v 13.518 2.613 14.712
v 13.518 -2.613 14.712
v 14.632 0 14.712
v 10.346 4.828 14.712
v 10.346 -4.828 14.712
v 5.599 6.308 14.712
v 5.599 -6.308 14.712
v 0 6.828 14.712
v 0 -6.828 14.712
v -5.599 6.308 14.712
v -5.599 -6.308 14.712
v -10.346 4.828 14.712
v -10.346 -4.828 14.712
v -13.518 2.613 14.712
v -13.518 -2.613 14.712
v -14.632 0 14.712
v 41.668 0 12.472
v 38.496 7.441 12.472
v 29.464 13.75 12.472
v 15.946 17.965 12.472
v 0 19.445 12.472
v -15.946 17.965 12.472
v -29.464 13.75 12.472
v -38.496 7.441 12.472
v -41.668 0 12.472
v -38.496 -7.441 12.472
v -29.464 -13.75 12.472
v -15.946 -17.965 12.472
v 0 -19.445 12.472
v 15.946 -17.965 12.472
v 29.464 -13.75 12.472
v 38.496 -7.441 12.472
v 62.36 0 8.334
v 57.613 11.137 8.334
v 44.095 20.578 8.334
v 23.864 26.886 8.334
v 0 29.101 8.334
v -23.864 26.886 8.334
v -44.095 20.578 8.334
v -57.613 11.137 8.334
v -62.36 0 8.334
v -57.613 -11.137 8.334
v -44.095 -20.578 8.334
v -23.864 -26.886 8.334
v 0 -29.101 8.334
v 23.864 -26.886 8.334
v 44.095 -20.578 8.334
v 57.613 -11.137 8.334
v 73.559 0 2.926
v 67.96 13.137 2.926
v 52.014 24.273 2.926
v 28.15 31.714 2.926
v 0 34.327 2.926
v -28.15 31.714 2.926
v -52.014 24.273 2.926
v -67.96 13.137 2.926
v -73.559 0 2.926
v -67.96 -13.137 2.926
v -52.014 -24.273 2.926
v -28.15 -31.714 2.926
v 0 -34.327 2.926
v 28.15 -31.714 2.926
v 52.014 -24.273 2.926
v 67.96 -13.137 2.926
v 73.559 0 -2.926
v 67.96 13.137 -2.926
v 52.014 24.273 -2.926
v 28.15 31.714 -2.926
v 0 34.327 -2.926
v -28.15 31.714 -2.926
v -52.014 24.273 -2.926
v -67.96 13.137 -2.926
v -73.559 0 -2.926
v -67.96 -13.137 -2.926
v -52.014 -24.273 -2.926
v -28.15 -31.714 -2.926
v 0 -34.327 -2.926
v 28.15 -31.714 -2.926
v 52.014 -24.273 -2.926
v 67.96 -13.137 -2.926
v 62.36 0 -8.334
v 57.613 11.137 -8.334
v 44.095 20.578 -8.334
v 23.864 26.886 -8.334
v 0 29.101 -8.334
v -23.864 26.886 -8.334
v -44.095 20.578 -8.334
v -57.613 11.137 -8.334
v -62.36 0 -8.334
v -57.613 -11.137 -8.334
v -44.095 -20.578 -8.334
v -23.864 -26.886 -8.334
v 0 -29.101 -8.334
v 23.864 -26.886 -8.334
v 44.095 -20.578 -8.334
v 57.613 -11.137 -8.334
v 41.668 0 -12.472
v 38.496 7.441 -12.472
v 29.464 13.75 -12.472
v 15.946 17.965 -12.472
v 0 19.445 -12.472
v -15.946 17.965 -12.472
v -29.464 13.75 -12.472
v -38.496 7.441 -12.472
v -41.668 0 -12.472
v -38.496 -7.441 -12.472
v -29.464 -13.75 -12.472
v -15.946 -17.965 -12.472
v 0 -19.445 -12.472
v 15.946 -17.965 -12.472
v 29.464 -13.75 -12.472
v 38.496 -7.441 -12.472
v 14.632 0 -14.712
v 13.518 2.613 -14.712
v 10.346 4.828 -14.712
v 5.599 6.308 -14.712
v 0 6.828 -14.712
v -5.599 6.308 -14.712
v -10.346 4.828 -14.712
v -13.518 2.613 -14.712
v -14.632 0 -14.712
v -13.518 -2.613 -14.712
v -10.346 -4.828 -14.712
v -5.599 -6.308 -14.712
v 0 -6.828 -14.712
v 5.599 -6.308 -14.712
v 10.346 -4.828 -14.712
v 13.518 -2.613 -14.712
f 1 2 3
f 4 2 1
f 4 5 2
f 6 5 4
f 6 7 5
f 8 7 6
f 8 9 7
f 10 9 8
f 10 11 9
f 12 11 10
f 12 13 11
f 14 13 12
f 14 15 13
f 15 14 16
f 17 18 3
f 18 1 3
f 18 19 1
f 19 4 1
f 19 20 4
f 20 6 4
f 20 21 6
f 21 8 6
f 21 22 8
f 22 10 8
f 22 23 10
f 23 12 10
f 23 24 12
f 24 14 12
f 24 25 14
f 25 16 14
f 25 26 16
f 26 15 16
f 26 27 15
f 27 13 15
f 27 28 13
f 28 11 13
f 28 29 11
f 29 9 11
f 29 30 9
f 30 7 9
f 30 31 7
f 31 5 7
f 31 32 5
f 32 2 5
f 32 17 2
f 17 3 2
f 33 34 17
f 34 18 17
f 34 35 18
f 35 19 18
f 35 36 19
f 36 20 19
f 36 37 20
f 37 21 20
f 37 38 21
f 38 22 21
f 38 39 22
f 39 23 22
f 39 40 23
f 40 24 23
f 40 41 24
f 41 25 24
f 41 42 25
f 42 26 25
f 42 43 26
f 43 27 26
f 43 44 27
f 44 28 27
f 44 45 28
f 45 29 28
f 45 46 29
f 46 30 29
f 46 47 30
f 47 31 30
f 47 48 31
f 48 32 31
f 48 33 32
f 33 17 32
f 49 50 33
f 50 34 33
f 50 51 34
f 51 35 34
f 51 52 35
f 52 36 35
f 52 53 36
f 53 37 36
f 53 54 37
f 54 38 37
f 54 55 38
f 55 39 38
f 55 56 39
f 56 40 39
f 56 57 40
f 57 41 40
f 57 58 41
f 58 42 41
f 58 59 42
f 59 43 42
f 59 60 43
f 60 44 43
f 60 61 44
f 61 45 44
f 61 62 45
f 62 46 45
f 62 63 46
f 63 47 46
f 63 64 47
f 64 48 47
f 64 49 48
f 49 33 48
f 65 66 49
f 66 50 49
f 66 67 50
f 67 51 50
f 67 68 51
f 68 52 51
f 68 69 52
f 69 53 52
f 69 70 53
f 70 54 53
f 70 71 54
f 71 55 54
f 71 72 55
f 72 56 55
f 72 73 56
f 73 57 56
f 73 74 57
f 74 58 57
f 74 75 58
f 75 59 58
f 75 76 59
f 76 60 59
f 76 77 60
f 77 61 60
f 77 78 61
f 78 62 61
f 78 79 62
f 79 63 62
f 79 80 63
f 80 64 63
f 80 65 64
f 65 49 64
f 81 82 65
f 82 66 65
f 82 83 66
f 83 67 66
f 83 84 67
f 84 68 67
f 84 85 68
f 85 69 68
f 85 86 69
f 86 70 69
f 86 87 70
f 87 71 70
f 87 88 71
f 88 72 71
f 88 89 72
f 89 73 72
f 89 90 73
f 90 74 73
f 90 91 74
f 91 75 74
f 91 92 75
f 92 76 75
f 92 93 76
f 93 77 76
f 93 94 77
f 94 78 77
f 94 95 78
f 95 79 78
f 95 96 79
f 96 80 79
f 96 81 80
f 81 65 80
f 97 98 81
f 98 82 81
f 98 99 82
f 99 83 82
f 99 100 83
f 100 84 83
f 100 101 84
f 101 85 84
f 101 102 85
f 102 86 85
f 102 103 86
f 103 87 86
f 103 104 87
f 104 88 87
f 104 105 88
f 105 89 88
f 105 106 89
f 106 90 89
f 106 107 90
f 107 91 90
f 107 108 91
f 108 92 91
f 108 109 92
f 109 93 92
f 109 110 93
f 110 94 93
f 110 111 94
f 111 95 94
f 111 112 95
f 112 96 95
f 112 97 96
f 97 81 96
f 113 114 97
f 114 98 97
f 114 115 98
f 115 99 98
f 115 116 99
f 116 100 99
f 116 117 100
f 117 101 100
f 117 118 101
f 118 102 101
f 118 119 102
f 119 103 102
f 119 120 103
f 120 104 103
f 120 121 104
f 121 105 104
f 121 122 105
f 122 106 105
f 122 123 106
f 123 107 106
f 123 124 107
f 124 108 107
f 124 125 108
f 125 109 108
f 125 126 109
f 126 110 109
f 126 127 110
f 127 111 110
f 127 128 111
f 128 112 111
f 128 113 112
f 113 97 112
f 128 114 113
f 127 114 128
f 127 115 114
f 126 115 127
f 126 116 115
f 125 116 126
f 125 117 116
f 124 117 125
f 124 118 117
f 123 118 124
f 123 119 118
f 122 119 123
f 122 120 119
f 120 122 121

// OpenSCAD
// Generated by SolidPython 1.0.1 on 2020-07-29 00:46:51


scale(v = [15, 7, 3]) {
	sphere(r = 5);
}
/***********************************************
*********      SolidPython code:      **********
************************************************
 
# import packages: SolidPython
from solid import *
from solid.utils import *
from itertools import chain, combinations, permutations


class Resize:

    def __init__(self, scad_file):
        self.scad_file = scad_file
        #self.scad_file = import_scad(scad_file)
        # cone/cylinder param:
        self.r1 = 0
        self.r2 = 0
        self.h = 0
        # rectangular prism param:
        self.w = 0
        self.l = 0
        # ellipse param:
        self.r = 0

    # import OpenScad code (file name corresponds to shape)


    # classify shape + parameters
    def assign(self, param1, param2, param3):
        if self.scad_file == 'cone.scad':
            self.r1 = param1
            self.r2 = param2
            self.h = param3
        elif self.scad_file == 'cylinder.scad':
            self.r1 = param1
            self.r2 = param2
            self.h = param3
        elif self.scad_file == 'rectangularPrism.scad':
            self.h = param1
            self.l = param2
            self.w = param3
        else:
            self.r = param1
            self.h = param2

    # resize parameters
    def iterate(self):
        x = range(3, 20, 2)
        i = 1
        if self.scad_file == 'cone.scad':
            tempList = list(permutations(x, 2))
            for temp in tempList:
                param1 = temp[0]
                param2 = temp[1]
                filepath = 'produced_scad_files/' + 'cone' + str(param1) + '_' + str(param2) + '_' + '.scad'
                scad_render_to_file(cylinder(h=param1, r1=param2, r2=0), filepath)

        elif self.scad_file == 'cylinder.scad':
            tempList = list(permutations(x, 3))
            for temp in tempList:
                param1 = temp[0]
                param2 = temp[1]
                filepath = 'produced_scad_files/' + 'cylinder' + str(param1) + '_' + str(param2) + '_' + '.scad'
                scad_render_to_file(cylinder(h=param1, r1=param2, r2=param2), filepath)

        elif self.scad_file == 'rectangularPrism.scad':
            tempList = list(permutations(x, 3))
            for temp in tempList:
                param1 = temp[0]
                param2 = temp[1]
                param3 = temp[2]
                filepath = 'produced_scad_files/' + 'rectangularPrism' + str(param1) + '_' + str(param2) + '_' + str(
                    param3) + '.scad'
                scad_render_to_file(cube(size=(param1, param2, param3)), filepath)

        elif self.scad_file == 'ellipse.scad':
            tempList = list(permutations(x, 4))
            for temp in tempList:
                param1 = temp[0]
                param2 = temp[1]
                param3 = temp[2]
                param4 = temp[3]
                filepath = 'produced_scad_files/' + 'ellipse' + str(param1) + '_' + str(param2) + '_' + str(param3) + '_' + str(param4) + '.scad'
                scad_render_to_file(scale([param1, param2, param3])(sphere(r=param4)), filepath)

    def render_to_scadfile(self):
        scad_render_to_file(scad, 'example.scad') 
 
************************************************/
